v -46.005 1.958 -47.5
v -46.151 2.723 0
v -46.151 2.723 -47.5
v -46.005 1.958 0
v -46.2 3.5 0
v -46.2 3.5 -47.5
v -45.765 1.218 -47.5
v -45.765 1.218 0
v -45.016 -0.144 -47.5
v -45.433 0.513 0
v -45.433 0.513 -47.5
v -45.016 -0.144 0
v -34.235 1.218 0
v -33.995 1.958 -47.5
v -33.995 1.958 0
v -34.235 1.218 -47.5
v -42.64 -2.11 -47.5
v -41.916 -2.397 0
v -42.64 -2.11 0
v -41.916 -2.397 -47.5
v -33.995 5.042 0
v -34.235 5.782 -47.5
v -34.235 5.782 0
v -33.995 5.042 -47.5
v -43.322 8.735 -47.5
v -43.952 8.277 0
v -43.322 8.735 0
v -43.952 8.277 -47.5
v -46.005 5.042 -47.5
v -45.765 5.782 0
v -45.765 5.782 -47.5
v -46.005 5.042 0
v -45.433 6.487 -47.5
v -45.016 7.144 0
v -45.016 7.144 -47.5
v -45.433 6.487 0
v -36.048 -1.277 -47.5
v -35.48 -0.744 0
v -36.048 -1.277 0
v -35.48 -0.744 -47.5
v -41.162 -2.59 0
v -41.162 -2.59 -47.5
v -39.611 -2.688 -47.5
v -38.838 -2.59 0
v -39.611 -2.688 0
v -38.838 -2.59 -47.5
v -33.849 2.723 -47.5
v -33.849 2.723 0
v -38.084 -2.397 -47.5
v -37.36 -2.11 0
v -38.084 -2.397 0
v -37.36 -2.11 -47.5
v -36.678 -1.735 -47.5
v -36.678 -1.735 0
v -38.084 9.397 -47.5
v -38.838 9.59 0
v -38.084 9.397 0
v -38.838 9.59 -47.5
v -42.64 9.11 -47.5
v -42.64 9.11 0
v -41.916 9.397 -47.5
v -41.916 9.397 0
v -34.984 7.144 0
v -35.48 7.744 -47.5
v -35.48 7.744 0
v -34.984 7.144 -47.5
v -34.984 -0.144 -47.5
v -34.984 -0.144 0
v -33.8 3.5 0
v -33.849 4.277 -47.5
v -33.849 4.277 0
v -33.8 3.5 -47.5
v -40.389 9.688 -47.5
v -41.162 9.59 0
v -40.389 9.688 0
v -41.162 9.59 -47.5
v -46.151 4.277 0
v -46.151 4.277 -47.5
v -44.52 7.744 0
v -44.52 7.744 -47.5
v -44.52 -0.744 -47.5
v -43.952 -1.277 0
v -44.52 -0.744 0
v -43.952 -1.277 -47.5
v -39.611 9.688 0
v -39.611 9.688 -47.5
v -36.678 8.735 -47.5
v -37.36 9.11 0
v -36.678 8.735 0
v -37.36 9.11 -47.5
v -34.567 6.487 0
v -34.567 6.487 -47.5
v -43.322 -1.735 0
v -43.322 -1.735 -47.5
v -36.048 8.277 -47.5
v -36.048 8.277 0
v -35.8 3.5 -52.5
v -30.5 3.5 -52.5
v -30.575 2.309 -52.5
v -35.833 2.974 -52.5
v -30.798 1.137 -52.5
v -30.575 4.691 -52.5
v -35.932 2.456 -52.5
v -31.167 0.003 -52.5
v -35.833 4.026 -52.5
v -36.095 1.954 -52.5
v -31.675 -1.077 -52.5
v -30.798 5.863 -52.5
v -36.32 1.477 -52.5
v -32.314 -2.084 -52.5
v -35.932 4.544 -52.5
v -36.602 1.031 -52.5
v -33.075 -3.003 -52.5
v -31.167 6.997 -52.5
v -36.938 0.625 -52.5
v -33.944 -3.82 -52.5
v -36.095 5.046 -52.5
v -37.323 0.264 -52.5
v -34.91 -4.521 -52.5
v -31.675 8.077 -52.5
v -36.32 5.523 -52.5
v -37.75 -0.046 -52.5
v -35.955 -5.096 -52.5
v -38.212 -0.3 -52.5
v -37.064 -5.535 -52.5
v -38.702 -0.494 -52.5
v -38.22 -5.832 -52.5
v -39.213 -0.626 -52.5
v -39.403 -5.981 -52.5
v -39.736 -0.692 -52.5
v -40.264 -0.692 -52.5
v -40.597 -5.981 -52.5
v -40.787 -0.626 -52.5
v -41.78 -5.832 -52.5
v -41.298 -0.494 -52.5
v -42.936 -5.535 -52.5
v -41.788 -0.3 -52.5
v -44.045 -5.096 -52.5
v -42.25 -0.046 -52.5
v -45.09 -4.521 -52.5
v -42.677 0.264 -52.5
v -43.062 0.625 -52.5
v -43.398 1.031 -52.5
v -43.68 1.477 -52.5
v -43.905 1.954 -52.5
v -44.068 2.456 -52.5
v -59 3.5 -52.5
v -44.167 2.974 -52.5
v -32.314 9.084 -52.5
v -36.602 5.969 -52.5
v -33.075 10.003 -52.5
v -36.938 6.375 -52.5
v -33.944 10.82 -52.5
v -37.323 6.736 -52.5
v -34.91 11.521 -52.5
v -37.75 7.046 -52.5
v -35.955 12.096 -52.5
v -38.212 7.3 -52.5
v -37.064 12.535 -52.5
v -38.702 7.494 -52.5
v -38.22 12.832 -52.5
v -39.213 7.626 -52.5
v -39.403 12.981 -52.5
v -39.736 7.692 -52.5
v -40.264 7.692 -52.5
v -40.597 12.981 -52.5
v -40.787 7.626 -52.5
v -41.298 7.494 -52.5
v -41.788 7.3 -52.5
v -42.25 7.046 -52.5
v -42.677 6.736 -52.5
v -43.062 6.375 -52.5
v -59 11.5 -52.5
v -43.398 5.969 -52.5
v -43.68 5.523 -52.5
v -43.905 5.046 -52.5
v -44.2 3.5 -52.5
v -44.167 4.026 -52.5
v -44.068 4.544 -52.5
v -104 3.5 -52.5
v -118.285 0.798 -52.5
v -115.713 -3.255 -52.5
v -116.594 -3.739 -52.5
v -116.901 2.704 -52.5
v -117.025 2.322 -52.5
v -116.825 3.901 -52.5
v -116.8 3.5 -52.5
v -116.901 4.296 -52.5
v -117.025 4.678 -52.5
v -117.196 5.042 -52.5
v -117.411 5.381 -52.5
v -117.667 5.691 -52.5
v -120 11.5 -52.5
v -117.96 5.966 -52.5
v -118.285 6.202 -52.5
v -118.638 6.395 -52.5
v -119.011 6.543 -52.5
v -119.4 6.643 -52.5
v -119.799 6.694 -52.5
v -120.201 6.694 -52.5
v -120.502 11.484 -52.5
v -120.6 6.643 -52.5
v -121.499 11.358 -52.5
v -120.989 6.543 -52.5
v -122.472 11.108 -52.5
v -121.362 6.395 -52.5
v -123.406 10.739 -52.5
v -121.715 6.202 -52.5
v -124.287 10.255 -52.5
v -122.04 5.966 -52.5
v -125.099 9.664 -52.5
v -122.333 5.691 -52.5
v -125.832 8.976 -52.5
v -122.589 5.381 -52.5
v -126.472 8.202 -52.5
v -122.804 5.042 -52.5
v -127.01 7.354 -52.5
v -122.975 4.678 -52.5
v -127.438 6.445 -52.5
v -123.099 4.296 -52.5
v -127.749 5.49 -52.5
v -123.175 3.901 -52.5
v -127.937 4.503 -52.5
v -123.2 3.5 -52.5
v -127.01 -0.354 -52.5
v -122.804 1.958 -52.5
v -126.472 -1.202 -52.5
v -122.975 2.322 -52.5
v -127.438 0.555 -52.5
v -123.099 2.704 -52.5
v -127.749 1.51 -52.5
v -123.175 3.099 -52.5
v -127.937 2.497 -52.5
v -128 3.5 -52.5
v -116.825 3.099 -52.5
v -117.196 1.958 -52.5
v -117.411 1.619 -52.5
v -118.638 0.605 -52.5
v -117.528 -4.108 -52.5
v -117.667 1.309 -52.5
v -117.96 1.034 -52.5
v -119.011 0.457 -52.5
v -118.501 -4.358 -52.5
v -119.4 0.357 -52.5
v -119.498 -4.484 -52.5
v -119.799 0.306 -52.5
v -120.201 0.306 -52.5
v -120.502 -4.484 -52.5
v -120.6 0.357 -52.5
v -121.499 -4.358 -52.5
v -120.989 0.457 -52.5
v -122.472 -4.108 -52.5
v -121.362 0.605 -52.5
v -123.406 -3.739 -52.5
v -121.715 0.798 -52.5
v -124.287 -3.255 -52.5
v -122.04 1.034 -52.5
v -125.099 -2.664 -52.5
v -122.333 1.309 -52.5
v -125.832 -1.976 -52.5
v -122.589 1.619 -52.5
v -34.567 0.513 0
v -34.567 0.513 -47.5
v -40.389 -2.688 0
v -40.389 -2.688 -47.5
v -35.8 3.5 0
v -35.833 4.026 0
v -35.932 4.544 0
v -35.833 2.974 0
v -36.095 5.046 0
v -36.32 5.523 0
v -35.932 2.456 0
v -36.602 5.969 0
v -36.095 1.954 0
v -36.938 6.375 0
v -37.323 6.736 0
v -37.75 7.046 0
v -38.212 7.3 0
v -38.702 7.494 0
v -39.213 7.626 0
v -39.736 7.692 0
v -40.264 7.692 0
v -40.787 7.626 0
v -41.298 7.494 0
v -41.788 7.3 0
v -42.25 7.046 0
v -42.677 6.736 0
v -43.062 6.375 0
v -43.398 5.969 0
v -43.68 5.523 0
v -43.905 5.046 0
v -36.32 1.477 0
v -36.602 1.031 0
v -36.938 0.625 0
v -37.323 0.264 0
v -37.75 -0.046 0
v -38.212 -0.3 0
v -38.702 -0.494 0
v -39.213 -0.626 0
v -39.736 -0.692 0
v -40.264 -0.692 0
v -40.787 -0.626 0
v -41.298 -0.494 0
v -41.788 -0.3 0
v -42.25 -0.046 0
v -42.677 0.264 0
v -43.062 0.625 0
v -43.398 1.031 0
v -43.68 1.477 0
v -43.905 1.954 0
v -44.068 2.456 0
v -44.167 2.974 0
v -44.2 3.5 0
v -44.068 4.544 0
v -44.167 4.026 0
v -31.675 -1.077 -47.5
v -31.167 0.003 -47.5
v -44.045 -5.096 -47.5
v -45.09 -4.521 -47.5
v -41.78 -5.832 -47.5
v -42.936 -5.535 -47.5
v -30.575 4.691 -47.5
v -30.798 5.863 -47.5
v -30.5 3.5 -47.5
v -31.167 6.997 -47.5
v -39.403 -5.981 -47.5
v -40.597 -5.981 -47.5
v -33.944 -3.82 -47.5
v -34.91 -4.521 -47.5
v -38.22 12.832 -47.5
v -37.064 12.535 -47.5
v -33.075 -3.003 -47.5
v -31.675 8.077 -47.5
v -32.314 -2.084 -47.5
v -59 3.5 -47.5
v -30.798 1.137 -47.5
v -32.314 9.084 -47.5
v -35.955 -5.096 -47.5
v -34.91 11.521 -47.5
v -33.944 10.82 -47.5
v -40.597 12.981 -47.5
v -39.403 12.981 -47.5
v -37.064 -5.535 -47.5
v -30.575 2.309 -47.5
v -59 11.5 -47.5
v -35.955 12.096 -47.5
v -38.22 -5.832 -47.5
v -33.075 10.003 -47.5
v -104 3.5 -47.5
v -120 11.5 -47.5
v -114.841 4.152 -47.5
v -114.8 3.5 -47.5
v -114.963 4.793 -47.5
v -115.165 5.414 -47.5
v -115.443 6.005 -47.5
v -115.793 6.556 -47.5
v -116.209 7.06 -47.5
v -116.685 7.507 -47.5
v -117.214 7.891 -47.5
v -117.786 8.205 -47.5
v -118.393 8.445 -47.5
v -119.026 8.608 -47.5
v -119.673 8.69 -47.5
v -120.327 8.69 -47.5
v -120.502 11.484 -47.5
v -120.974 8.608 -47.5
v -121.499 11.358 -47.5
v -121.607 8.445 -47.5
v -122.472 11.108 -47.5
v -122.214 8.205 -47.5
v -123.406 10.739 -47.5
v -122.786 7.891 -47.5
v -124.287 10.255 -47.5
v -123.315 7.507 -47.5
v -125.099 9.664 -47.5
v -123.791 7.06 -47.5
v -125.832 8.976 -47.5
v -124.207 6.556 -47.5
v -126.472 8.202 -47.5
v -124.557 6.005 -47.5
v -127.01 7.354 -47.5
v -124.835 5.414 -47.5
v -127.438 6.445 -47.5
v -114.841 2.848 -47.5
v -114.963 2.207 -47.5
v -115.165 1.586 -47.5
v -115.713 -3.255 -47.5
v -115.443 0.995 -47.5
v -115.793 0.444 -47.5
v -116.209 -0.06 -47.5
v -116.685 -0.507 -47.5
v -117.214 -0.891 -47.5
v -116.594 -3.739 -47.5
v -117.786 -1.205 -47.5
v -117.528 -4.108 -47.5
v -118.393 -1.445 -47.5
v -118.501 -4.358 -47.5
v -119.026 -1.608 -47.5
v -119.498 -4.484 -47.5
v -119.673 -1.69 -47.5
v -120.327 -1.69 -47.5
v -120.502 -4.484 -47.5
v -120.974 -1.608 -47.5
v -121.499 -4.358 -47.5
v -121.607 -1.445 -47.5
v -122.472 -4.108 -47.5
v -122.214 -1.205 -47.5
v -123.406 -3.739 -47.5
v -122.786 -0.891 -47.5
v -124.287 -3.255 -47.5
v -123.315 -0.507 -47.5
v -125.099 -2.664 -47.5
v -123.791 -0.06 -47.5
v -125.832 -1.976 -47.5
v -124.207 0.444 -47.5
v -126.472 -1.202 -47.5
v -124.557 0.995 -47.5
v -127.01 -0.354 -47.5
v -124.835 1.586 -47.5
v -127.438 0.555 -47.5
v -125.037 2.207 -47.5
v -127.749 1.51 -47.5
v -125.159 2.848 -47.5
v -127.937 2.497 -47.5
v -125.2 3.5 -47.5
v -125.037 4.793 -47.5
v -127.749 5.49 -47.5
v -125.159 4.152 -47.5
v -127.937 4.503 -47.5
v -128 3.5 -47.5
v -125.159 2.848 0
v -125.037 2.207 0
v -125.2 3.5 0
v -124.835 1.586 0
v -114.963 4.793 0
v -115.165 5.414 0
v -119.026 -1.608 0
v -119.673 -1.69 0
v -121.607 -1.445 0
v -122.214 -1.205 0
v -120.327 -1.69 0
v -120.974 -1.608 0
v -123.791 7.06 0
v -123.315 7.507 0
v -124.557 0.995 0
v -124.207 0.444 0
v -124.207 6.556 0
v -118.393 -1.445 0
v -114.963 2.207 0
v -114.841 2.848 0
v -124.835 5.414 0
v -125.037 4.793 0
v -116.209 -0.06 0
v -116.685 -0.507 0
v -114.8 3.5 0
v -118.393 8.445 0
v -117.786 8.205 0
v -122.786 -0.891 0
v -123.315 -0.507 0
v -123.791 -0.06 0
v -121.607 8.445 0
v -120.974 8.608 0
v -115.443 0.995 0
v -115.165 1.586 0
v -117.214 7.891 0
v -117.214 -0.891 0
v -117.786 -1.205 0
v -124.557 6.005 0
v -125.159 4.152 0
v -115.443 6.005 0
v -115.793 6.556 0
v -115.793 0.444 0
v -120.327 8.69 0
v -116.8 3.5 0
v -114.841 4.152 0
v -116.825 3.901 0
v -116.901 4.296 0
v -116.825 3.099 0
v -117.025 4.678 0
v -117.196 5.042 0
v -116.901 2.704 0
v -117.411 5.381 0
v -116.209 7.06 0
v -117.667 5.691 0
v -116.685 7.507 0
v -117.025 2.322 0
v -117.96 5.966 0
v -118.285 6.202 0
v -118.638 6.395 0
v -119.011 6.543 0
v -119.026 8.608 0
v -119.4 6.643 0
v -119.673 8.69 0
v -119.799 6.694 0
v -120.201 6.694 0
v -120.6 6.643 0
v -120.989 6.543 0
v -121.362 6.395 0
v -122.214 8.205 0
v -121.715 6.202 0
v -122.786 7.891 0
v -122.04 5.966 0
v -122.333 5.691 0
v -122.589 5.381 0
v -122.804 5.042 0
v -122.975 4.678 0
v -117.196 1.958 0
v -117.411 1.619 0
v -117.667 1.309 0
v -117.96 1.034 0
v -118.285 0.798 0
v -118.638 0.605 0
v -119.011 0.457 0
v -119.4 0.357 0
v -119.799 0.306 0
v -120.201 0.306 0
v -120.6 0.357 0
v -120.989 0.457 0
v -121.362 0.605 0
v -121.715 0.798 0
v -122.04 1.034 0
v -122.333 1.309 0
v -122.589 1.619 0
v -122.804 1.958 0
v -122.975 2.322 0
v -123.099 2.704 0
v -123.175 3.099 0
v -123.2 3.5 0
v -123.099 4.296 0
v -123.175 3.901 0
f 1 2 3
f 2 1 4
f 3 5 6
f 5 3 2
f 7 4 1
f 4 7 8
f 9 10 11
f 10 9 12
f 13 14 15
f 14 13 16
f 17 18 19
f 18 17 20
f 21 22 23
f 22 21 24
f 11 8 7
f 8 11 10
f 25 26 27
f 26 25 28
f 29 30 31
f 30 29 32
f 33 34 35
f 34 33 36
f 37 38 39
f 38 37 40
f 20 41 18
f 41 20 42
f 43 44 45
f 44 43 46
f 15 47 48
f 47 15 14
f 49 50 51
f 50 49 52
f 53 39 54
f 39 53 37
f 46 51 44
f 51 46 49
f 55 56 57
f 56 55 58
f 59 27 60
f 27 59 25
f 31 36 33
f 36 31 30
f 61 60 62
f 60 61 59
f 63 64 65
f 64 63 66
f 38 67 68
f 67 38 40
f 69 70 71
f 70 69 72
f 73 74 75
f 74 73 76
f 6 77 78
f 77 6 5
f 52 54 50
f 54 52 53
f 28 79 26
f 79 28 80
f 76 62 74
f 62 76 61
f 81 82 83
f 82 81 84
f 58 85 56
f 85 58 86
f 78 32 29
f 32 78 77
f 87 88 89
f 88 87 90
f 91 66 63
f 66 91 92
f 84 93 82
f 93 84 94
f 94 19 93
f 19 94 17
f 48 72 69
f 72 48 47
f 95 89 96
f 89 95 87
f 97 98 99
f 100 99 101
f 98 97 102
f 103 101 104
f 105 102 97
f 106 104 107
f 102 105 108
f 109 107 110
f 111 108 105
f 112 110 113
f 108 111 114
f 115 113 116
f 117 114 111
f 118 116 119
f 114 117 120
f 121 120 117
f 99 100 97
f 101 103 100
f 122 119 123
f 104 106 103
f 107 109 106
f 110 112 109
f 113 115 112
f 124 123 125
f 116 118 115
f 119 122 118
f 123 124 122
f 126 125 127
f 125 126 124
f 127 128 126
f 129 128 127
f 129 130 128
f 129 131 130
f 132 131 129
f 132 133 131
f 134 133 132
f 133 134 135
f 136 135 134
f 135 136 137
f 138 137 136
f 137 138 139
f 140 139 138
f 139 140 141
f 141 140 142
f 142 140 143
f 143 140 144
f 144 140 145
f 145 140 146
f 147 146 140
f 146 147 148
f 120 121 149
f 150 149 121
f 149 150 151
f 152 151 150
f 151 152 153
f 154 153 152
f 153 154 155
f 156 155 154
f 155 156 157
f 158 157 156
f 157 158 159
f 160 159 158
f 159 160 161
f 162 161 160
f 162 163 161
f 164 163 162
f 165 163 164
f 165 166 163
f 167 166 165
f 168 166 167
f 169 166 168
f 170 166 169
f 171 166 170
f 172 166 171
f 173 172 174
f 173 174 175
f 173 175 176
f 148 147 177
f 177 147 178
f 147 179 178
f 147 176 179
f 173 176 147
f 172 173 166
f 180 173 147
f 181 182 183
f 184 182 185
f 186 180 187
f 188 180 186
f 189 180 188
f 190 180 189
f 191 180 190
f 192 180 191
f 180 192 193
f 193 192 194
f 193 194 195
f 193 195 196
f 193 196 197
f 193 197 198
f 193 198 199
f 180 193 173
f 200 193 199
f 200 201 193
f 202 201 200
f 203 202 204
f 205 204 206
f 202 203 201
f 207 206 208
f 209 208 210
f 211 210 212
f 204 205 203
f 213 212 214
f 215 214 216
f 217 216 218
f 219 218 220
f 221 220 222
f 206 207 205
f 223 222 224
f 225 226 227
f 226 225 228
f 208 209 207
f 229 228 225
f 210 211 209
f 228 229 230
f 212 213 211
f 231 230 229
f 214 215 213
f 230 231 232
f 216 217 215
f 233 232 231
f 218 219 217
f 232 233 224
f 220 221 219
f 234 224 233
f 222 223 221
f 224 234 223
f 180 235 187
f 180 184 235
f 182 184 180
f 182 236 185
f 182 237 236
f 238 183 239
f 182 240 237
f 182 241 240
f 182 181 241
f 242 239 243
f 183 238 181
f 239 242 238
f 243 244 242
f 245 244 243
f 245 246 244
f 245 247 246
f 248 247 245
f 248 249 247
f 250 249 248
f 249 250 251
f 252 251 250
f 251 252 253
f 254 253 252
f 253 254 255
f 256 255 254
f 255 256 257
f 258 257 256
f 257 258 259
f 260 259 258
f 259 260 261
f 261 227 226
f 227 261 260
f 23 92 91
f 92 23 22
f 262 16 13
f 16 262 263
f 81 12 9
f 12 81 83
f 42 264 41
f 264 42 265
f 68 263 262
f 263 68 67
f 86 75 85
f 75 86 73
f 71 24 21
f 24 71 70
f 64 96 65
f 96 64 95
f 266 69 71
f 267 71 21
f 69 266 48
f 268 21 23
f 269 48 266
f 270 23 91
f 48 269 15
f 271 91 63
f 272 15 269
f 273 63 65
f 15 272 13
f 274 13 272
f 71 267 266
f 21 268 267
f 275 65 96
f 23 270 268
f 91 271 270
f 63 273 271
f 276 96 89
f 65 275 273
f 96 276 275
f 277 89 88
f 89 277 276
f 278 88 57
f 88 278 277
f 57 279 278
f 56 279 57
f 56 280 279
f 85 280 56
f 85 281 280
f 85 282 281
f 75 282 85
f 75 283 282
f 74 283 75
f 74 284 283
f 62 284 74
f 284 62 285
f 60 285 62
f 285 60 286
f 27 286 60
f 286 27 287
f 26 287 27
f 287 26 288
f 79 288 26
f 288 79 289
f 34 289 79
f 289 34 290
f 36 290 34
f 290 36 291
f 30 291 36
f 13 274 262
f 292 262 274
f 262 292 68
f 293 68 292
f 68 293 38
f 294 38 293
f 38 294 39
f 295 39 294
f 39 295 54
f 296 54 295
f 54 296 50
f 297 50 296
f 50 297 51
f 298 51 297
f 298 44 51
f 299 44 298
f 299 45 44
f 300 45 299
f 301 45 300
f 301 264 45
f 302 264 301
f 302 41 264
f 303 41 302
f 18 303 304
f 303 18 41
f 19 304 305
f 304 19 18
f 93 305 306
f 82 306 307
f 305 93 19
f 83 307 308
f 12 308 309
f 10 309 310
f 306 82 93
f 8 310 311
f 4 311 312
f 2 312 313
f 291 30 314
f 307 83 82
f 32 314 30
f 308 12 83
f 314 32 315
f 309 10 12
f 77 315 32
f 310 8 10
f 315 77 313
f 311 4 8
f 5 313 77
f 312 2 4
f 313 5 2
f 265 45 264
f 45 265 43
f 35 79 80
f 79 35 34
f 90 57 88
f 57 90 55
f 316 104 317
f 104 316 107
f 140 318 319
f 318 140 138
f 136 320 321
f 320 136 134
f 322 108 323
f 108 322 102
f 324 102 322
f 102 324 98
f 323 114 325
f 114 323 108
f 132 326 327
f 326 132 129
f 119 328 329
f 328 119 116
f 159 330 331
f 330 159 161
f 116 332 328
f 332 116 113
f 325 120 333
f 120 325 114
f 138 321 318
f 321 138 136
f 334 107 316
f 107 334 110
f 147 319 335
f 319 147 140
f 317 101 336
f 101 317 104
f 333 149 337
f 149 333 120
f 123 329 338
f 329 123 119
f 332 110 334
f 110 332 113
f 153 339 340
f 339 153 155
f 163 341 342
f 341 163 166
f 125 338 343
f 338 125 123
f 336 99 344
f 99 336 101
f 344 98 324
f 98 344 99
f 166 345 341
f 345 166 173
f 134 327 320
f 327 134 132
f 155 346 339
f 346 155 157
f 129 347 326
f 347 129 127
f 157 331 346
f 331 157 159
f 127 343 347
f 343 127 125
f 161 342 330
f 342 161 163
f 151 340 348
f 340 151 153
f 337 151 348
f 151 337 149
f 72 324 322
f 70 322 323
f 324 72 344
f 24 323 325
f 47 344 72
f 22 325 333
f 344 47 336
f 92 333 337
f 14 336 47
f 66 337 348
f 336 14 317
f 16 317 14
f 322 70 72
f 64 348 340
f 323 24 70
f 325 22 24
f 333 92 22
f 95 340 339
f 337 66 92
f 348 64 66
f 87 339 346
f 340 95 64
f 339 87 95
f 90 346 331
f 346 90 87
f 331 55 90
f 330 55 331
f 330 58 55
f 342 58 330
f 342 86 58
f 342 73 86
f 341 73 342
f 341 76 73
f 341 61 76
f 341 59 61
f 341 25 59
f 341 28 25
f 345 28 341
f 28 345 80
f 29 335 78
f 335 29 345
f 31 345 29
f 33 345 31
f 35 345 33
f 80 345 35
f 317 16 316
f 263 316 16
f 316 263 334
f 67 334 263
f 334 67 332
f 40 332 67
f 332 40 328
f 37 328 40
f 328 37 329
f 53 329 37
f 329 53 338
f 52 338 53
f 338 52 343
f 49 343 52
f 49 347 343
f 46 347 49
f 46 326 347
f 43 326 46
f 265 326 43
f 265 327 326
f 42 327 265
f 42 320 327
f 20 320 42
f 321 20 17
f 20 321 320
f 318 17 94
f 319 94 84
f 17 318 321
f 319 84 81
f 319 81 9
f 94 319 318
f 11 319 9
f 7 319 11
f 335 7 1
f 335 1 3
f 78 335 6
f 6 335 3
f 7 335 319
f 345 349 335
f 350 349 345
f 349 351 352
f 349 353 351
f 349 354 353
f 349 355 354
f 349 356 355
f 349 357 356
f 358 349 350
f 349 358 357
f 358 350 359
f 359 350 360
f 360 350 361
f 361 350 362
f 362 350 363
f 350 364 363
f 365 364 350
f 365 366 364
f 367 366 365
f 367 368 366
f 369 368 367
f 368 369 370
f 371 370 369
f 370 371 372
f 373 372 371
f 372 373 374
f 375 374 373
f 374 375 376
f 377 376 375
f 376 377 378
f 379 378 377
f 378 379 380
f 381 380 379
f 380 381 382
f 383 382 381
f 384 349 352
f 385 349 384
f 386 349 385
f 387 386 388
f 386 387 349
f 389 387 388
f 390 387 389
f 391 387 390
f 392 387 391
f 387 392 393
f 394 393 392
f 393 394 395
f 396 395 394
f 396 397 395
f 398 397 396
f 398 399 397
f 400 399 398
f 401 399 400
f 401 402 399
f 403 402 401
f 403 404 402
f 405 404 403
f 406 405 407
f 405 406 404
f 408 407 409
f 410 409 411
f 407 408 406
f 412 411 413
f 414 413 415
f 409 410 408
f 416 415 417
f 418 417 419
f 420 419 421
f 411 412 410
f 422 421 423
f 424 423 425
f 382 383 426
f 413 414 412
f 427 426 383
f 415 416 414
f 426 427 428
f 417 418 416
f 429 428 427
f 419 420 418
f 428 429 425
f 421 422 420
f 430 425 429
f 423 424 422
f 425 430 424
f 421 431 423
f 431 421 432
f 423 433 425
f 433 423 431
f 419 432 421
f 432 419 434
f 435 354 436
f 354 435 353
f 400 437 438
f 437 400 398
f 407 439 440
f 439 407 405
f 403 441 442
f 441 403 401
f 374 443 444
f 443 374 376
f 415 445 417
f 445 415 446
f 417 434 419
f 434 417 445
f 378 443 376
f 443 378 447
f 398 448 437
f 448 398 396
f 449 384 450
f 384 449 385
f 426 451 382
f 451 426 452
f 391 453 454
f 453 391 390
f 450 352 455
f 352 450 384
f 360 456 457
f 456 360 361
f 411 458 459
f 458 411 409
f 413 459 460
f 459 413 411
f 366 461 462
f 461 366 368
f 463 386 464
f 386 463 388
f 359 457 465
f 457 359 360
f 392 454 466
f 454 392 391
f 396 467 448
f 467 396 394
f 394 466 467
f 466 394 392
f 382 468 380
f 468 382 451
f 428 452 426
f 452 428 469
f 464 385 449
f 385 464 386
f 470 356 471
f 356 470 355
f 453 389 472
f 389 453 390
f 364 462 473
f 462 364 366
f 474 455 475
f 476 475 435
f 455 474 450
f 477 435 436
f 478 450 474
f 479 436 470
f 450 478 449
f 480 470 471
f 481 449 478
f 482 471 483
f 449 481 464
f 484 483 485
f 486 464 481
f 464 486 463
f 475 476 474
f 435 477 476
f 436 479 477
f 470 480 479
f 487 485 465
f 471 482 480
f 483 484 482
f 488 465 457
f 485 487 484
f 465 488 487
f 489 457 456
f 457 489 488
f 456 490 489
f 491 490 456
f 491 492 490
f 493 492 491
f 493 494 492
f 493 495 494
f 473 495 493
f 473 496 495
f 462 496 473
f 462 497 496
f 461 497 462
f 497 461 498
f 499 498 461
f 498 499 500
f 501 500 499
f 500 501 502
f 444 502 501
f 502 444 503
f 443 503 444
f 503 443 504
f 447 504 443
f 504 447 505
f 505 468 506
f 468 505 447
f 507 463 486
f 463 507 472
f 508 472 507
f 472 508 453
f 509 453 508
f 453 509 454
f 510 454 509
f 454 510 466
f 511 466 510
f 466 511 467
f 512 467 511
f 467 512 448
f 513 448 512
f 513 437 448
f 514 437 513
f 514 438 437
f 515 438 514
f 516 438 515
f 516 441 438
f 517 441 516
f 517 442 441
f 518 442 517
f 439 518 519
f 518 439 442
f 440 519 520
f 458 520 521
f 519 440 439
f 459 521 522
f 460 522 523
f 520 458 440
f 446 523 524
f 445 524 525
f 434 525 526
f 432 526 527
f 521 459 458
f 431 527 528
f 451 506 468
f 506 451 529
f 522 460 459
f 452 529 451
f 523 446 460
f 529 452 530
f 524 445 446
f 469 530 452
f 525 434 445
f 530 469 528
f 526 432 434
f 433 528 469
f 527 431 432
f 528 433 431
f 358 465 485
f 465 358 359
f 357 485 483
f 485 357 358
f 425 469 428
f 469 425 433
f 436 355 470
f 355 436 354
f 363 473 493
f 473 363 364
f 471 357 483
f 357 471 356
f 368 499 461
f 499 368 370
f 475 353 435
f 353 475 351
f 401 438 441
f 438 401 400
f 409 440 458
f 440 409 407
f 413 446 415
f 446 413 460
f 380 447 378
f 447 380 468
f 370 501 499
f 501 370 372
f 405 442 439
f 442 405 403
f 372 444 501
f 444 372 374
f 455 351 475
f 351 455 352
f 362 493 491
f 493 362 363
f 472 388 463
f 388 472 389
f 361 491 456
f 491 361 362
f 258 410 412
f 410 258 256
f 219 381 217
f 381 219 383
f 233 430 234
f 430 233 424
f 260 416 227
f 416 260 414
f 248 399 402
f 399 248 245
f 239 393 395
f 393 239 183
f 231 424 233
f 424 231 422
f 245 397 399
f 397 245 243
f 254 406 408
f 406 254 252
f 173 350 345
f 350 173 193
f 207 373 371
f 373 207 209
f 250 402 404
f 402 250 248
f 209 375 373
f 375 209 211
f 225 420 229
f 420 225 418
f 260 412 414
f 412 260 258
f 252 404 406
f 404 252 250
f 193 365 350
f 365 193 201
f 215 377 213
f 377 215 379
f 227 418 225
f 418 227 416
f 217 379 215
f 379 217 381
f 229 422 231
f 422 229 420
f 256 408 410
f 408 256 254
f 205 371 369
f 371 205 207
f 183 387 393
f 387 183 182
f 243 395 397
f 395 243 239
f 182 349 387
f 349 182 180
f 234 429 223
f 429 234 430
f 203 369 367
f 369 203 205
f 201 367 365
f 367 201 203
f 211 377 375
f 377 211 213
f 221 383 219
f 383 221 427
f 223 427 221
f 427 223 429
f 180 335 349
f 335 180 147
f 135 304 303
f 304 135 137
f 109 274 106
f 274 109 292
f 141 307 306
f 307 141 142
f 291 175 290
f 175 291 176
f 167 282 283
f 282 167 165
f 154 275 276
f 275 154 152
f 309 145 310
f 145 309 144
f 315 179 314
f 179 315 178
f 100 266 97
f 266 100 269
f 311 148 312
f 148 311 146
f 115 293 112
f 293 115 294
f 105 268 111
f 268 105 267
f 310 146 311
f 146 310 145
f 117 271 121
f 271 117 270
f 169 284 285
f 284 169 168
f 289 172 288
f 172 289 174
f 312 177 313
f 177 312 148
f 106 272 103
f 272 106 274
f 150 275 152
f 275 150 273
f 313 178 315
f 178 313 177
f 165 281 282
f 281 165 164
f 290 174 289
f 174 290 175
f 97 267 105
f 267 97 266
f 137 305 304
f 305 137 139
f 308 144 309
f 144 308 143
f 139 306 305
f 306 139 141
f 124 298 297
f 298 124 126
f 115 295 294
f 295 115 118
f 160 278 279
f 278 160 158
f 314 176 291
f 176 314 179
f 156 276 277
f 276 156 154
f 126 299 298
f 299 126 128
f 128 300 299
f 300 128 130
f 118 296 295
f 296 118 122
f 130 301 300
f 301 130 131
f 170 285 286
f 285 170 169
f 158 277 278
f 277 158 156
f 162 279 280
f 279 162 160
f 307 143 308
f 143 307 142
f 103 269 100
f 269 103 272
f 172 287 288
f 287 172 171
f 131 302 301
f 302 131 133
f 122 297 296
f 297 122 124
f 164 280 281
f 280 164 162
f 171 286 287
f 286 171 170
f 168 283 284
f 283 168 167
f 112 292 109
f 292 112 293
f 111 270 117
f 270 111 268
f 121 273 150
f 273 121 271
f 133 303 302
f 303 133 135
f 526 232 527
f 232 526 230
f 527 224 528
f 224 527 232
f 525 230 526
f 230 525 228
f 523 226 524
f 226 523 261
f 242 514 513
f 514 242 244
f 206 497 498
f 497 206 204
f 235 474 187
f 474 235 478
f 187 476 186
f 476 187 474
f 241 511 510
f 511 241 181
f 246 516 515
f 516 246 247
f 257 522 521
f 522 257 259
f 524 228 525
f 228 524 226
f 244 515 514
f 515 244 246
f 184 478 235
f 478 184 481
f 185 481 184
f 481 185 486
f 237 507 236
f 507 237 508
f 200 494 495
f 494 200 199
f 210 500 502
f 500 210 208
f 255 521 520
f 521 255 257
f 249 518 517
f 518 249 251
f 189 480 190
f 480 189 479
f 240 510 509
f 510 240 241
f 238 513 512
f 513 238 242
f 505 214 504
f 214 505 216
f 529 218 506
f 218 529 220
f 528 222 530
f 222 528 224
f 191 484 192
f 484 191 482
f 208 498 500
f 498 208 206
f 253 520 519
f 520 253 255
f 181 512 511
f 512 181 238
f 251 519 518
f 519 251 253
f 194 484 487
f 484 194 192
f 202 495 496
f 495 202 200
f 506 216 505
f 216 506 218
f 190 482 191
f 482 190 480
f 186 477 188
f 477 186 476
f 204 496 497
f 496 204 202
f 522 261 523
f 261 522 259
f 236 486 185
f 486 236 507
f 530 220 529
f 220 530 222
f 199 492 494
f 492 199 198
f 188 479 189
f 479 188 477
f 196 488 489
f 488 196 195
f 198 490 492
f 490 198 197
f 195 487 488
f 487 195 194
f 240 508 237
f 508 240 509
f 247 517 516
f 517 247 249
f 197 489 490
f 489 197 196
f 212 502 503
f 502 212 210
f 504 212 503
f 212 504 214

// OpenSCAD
// file: ../planelib/motor.scad
yoff=10+2;
xoff=5;//10+17;
xlen=200;

module wingBoom( bd=8, diff=0.1, len=500 )
{
    translate([xoff,yoff,zBoom])
    translate([ -200,0,0]) rotate([0,90,0])cylinder(d=bd+diff,h=len,center=true);  //8mm version

}



module wingMotorPlate( diff=0, holes=true )
{
    h0=12;
    module mcylinder( diff=0 )
    {
        rotate([0,-90,0]) 
            translate([ 0,0,-3-diff ]) 
                cylinder(d=33+diff, h=55+diff,center=false);   // body cylinder
    }
    
    module mholes()
    {
        rotate([0,-90,0]) 
            ScrewMotorPlate(screwlen=60);
    }
    
    module cable_hole()
    {
        translate( [ -3, 15, 0 ] )
        rotate([90,0,0])
        hull(){
            translate([-10,0,0]) cylinder(d=5,h=10,center=true );
            translate([0,-2,0]) cylinder(d=4,h=10,center=true );
            translate([0,+2,0]) cylinder(d=4,h=10,center=true );
        }
    }

    difference(){
        union()
        {
            translate([xoff,yoff,zBoom])
                difference(){
                    mcylinder(0+2*diff);
                    if( holes==true ){
                        mcylinder(-4-2*diff);
                        mholes();
                        cable_hole();
                    }
                }
            translate([xoff,yoff,zBoom])
                intersection(){
                    mcylinder(0);
                    translate([-tubeOffset1-xoff ,tubeOffsety-yoff, 0]) 
                        cylinder(d=dBar1+8, h=33,center=true ); // bar mount
                    }
        }
        union()
        {
            if( holes==true ){
                translate([-tubeOffset1 ,tubeOffsety, zBoom]) 
                            cube([dBar1+10,dBar1+10,12+0.2], center=true );
                translate([ xoff-120/2-tubeOffset1, yoff, zBoom]) 
                    rotate([0,90,0])
                        cylinder(d=8+0.3+4+0.5,h=140,center=true);  // mount for boom 8mm version
                            
                wingPolyLine( d=dPoly, pt=pSD6060[31], off=[+2,+0.5] );
                wingElectric();
                xTube( diameter=8+0.1, length=1000, tubeoffset=tubeOffset1 );
                translate( [-xoff+0, yoff-11.2, zBoom ] ) 
                    rotate([90,0,0])
                        ScrewAndHexNut( m=2,dist=10 );
                }
            
        }
    }


}

module wingMotor(diff=0, holes=true) //use diff!!!!!
{
    h0=12; //10;    
    {
        difference(){
            union(){
                Slice(){
                    wingSolid(r=-1/*diff*/);
                    translate([ xoff-130/2-3-10, yoff-15+1, zBoom]) cube([150,25+2,h0], center=true );
                    }
                
                translate([-tubeOffset1 ,tubeOffsety, zBoom]) cylinder(d=dBar1+10, h=h0,center=true );
                translate([-tubeOffset2 ,tubeOffsety, zBoom]) cylinder(d=dBar2+10, h=h0,center=true );
                
                translate([ xoff-120/2-tubeOffset1, yoff, zBoom]) rotate([0,90,0])cylinder(d=8+4,h=120,center=true);  //8mm version
                
                }
            union(){
                translate([xoff-153,yoff-21,zBoom])
                    rotate([0,0,-45])
                        cube([20,20,20], center=true );

                if( holes==true ){
                    color("Black") wingBoom();
                    color("Black") xTube( diameter=8+0.2, length=1000, tubeoffset=tubeOffset1 );
                    color("Black") xTube( diameter=6+0.2, length=400, tubeoffset=tubeOffset2 );   
                    wingMotorPlate(diff=0.1); 
                    wingPolyLine( d=dPoly, pt=pSD6060[31], off=[+2,+0.5] );
                    *wingPolyLine( d=dPoly, pt=ptQRuder, off=[+0,+0] );
                    wingElectric();
                    translate( [-xoff+0, yoff-11.2, zBoom ] ) 
                        rotate([90,0,0])
                            ScrewAndHexNut( m=2,dist=10 );
                    translate([xoff,yoff,zBoom])
                        translate([-83,-8,0]) rcube([54,4,20], round=3);
                    translate([xoff-35,yoff-15,zBoom]){
                        translate([-113,2,0]) cube([30,20,1.2], center=true );
                        translate([-113,8,0]) ScrewAndHexNut( m=2,dist=8 );
                        }
                        
                    }
                }
        }
       
    }
    
    *translate([xoff,yoff,zBoom]){
        color("Red") translate([15+12,0,0]) rotate([0,90,0]) cylinder(d=7*25.4,h=8,center=true);   // propeller     
        color("Red") translate([12,0,0]) rotate([0,90,0]) cylinder(d=33,h=17,center=true);   // motor
        *%translate([0,-60,0]) cube( [300,1,500], center=true );
        }
    *color("Black") xTube( diameter=8, length=1000, tubeoffset=tubeOffset1 );
    *color("Black") xTube( diameter=6, length=400, tubeoffset=tubeOffset2 );    
    *wingMotorPlate(diff=0);

}

module wingMotorCoverSolid()
{
    diff=0;
    hull(){
        translate([xoff-55,yoff,zBoom]) // body cylinder taken from wingMotorPlate()
            rotate([0,-90,0]) 
                translate([ 0,0,-3-diff ]) 
                    cylinder(d=33+diff, h=1,center=false);   
        translate([ xoff-120+0.5-tubeOffset1, yoff, zBoom]) rotate([0,90,0])cylinder(d=8+4+2,h=1,center=true);  // taken from wingMotor
        }
}

module fuseMotor(d=0.5, holes=true) // not needed with two motors at the wings
{
// 19mm Löcher, Motokreuz: Balken mit 2 Schrauben, Gegenstück in den Rumpf kleben....
    translate([9.5,0,0])
    difference()
    {
        union()
        {
            translate([-280,0,0]){   // cutout inner Motormount
                rotate([0,90,0]) cylinder( d=30-d, h = 3 ); // h=5 was too fat, because it is solid
                }
            translate([-282,0,0]){   // cutout outer Motormount
                rotate([0,90,0]) cylinder( d=35-d, h=3 );
                }
            translate([-282,0,0]){   // cutout outer Motormount
                rotate([0,90,0]) resize([50,20,3])cylinder( d=35-d, h=3 );
                }
            translate([-260,0,+20]) 
                    rotate([0,-90,0]) 
                        cylinder( d=3.8, h=30 );   
            translate([-260,0,-20]) 
                    rotate([0,-90,0]) 
                        cylinder( d=3.8, h=30 );  
            if( !holes ){
            translate([-250+6,0,-20]) 
                    rotate([0,-90,0]) 
                        cylinder( d=6.5, h=30,$fn=6 );   
            translate([-250+6,0,+20]) 
                    rotate([0,-90,0]) 
                        cylinder( d=6.5, h=30,$fn=6 );   
                }
            
        }
        if(holes)
        union()
        {
            translate([-270,0,0]) 
                    rotate([0,-90,0]) 
                        cylinder( d=9, h=40 );   
            translate([-270,0,0])
                rotate([0,-90,0])
                    for( rot=[0:90:360] )
                        rotate([0,0,rot+45])
                            translate([0,19/2,0])
                                    cylinder( d=3.8, h=40 );
            translate([-260,0,+20]) 
                    rotate([0,-90,0]) 
                        cylinder( d=3.8, h=30 );   
            translate([-260,0,-20]) 
                    rotate([0,-90,0]) 
                        cylinder( d=3.8, h=30 );   
        }
    }
}
// file: ../planelib/ruder2.scad
// Ruder new version, test with small cut, printable?

*cutterObjectAll( ptStart=[0,0,0], dStart=20, ptStop=[-20,0,100], dStop=10, dSpace=1.0 );
*cutterMask( ptStart=[0,0,0], dStart=20+2*1, ptStop=[-20,0,100], dStop=10+2*1 );

function RuderGetSize( z, zStart, zStop, sStart, sStop ) = ( ( sStart + (sStop-sStart)/(zStop-zStart)*(z-zStart) ) );
function RuderGetHeight( z, zStart, zStop, sStart, sStop, hBase ) = ( RuderGetSize( z, zStart, zStop, sStart, sStop) * hBase );
function RuderGetPoint( z, zStart, zStop, sStart, sStop, ptBase ) = ( RuderGetSize( z, zStart, zStop, sStart, sStop) * ptBase );
function RuderGetXOffset( z, zStart, zStop, oStart, oStop ) = ( ( oStart + (oStop-oStart)/(zStop-zStart)*(z-zStart) ) );

module Ruder2( ptStart=[0,0,0], dStart=20, ptStop=[0,0,100], dStop=10, dSpace=1.0, rot=45, steps=5, inverse=false, horn=false )
{
    difference(){
        children();
        cutterObjectAll(  ptStart, dStart, ptStop, dStop, dSpace, rot, steps, inverse );
        cutterInnerAxis( ptStart, ptStop );
        cutterEnds( ptStart, dStart, dSpace, axis=false );
        cutterEnds( ptStop, dStop, dSpace, axis=false );
        }
        
    if( horn ) 
        RuderHorn( dbase=dStart, pos = ptStart + [0,0,dSpace/2] );
}

module RuderHorn( dbase, daxsis=2.2, dwire=2, pos=[0,0,0], h=2, a=18 )
{
    b=a;
    translate( pos ) 
        difference(){
            union(){
                hull(){
                    translate([0,0,0])  cylinder( d=dbase-2, h=h, center=false );
                    translate([-a,0,0]) cylinder( d=2, h=h, center=false );
                    }
                hull(){
                    translate([-a,0,0]) cube( [10,1,h], center=false );
                    translate([0,b,0])  cylinder( d=6, h=h, center=false );
                    }
                }
            union(){
                translate([0,0,0])  cylinder( d=daxsis, h=h, center=false );
                translate([0,b,0])  cylinder( d=dwire, h=h, center=false ); 
                //translate([-a,0,0])  cylinder( d=dwire, h=h, center=false ); 
                c = b-6/2-dbase/2; 
                *translate([-c,c,0])  cylinder( d=c, h=h, center=false ); 
            }
    }
}

module cutterObjectAll( ptStart, dStart, ptStop, dStop, dSpace, rot=45, steps=5, inverse=false )
{
    ptDelta = (ptStop - ptStart) / steps; 
    dDelta = (dStop - dStart) / steps; 
    
    for( i=[0:steps-1] )
    {
        dir = inverse ? !((i%2)==0) : ((i%2)==0) ;
        cutterObjectSingle(  
            ptStart+i*ptDelta, dStart+i*dDelta, 
            ptStart+(i+1)*ptDelta, dStart+(i+1)*dDelta, 
            dSpace, dir, steps );
    }
}

module cutterObjectSingle( ptStart, dStart, ptStop, dStop, dSpace, dir=false, rot=45 )
{
    difference()
    {
        union()
        {
            cutterCylinder( ptStart, dStart+2*dSpace, ptStop, dStop+2*dSpace );
            if( dir == true )
            {
                cutterMask( ptStart, dStart+2*dSpace, ptStop, dStop+2*dSpace, dir, rot=+rot );
                cutterMask( ptStart, dStart+2*dSpace, ptStop, dStop+2*dSpace, dir, rot=-rot );
            }
            cutterSpacer( ptStart, dStart+2*dSpace, dSpace );
            cutterSpacer( ptStop, dStop+2*dSpace, dSpace ); // this partly dublicate
        }
        union()
        {
            cutterCylinder( ptStart, dStart, ptStop, dStop );
            cutterHalf( ptStart, dStart, ptStop, dStop, dir );
        }
    }
}

module cutterCylinder( ptStart, dStart, ptStop, dStop )
{
    hull()
    {
        translate( ptStart ) cylinder( d=dStart, h=0.001, center=true );
        translate( ptStop )  cylinder( d=dStop, h=0.001, center=true  );
    }
}

module cutterMask( ptStart, dStart, ptStop, dStop, dir=true, rot=40 )
{
    oxStart = dir ? 0 : -dStart;
    oxStop = dir ? 0 : -dStop;
    
    hull(){
        translate( ptStart ) 
            rotate( [0,0,rot] )
                translate( [oxStart,-dStart/2,0] )
                    cube([dStart/2,dStart, 0.001], center=false );
        translate( ptStop ) 
            rotate( [0,0,rot] )
                translate( [oxStop,-dStop/2,0] )
                    cube([dStop/2,dStop, 0.001], center=false );
        }
}

module cutterHalf( ptStart, dStart, ptStop, dStop, dir=true )
{
    oxStart = dir ? 0 : -dStart;
    oxStop = dir ? 0 : -dStop;
    hull(){
        translate( ptStart ) 
                translate( [oxStart,-dStart,0] )
                    cube([dStart,2*dStart, 0.001], center=false );
        translate( ptStop ) 
                translate( [oxStop,-dStop,0] )
                    cube([dStop,2*dStop, 0.001], center=false );
        }
}

module cutterSpacer( ptStart, dStart, dSpace )
{
    translate( ptStart )
        cylinder( d=dStart, h=dSpace, center=true );
}

module cutterInnerAxis( ptStart, ptStop, dAxis=2.2 )    // set the correct parameter dAxis
{
    hull()
    {
        translate( ptStart ) sphere( d=dAxis );
        translate( ptStop ) sphere( d=dAxis );
    }
}

module cutterEnds( pt, d, dSpace, axis=false )
{
    translate( pt ) 
        difference()
        {
            union()
            {
                cylinder( d=d+2*dSpace, h=dSpace, center=true );
                translate( [-100,-20,-dSpace/2] ) cube( [100,40,dSpace], center=false );
            }
            if ( axis==false ) cylinder( d=d+2*dSpace, h=dSpace, center=true );
        }
}
// file: ../planelib/screw.scad
// screw and nut helper


//ScrewAndHexNut( m=2, $fn=50 );

module ScrewAndHexNut( m=2, dist=10 )
{
    
    dscrew  = (m==2) ? 2.3 : ((m==3) ? 3.2 : 4.1 );   // screw, loose
    dnut    = (m==2) ? 4.6 : ((m==3) ? 6.2 : 8.0 );   // hex nut, measured
    dhead   = (m==2) ? 4.2 : ((m==3) ? 5.8 : 7.0 );   //hex head
    
    translate( [ 0, 0, -dist/2-10/2 ] ) 
        cylinder(d=4.6, h=10, center=true, $fn=6 ); //m2 nut, 6 edge hole
    translate( [ 0, 0, 0 ] ) 
        cylinder(d=2.3, h=dist+20, center=true ); //m2 screw
    translate( [ 0, 0, +dist/2+10/2 ] ) 
        cylinder(d=4.2, h=10, center=true ); //m2 head
}

module ScrewServo( dist=10 )
{
    cylinder(d=1.5, h=dist ); // servo screw, does not realy fit
}

module ScrewMotorPlate( dscrew=3.5, distmin=15.5, distmax=19.5, dcenter=8, rotoffset=0, screwlen=6, plate=6 )
{
    for( a=[45:90:360]) 
        rotate([0,0,a+rotoffset]) 
            hull(){
                translate( [0, distmax/2, -plate-0.1] ) // max plate is fixed 6
                    cylinder( d=dscrew, h=screwlen, center=false ); // motor screws
                translate( [0, distmin/2, -plate-0.1] ) 
                    cylinder( d=dscrew, h=screwlen, center=false ); // motor screws
                }
    translate( [0, 0, -plate-0.1] ) 
        cylinder( d=dcenter, h=plate+1, center=false ); // motor center

}
// file: ../planelib/servo.scad
servo_size_1 = [25.5,12,37];  // mg90s
servo_size_2 = [33.5,12,3];

*servo_sg90($fn=50);

module servo_sg90()
{
        cube( servo_size_1, center=true );
        translate([0,0,3.5]) 
            cube( servo_size_2, center=true );
        // servoarm...
        translate([-5,6,17])
        resize([60,12,6+1])
        sphere( d=1 );
}
    

module ServoDiff( sx=100, sy=7, sz=348, rot=0 )
{ 
    //sx = s[i]*(tubeOffset1+tubeOffset2)/2;  // between the tubes
    //sz = (o[i+1].z-o[i].z)/2;   // in the middle of the segment
    //sz = -2;
    translate( [-sx, sy, sz])
            rotate([0,rot, 2])
                servo_sg90();
                
    
    // kabelkanal
    *translate( o[i] + [-sx+10, +11-2-2, hz/2-13])
            rotate([0,90,4])
                cube([12,5,10]);
}
// file: ../planelib/polyline.scad
module wingPolyLine( d=3, pt=[0,0], off=[0,0]  )
{
    *echo(pt);
    l = len(s)-1; 
    poly = [         [o[0].x - s[0]*pt.x - off.x , o[0].y + s[0]*pt.y + off.y,  o[0].z - 20 ],
        for(i=[0:l]) [o[i].x - s[i]*pt.x - off.x , o[i].y + s[i]*pt.y + off.y,  o[i].z ],
                     [o[l].x - s[l]*pt.x - off.x , o[l].y + s[l]*pt.y + off.y,  o[l].z + 20 ] ];
    *echo( poly);
    for( i=[0:(len(poly)-2)] ){
        hull(){
            translate(poly[i]) 
                sphere( d=d );
            translate(poly[i+1]) 
                sphere( d=d );
            }
        }
}

module fusePolyLine( d=3, size=605, off=[0,0], p=pClarkFusePolyUp )
{
    for( i=[0:(len(p)-2)] ){
        hull(){
            translate([p[i].x*size, p[i].y*size+off.y, +off.x]) 
                sphere( d=d );
            translate([p[i+1].x*size, p[i+1].y*size+off.y, +off.x]) 
                sphere( d=d );
            }
        *echo( p[i] );
        }
}

module fusePolyLineQ( d=3, size=605, pt=[0,0], off=[0,0] )
{
    poly = [        
                    [o[1].x - s[1]*pt.x - off.x , o[1].y + s[1]*pt.y + off.y,  +o[1].z ],
                    [o[0].x - s[0]*pt.x - off.x , o[0].y + s[0]*pt.y + off.y,  +o[0].z ],
                    [o[0].x - s[0]*pt.x - off.x , o[0].y + s[0]*pt.y + off.y,  -o[0].z ], 
                    [o[1].x - s[1]*pt.x - off.x , o[1].y + s[1]*pt.y + off.y,  -o[1].z ]
                    ];
                    
        for( i=[0:(len(poly)-2)] ){
                hull(){
                    translate(poly[i]) 
                        sphere( d=d );
                    translate(poly[i+1]) 
                        sphere( d=d );
                    }
        }
}

module offsetPolyLine(  d=3, size=605, off=10, p=pClarkY )  // this does not yet work, just a test.
{
    for( i=[0:(len(p)-1)] ){
        po = size * p[i];
        pv = size * ((i>0) ? p[i-1] : p[len(p)-1]);
        pn = size * ((i>(len(p)-2)) ? p[0] : p[i+1]);

        pop = (pv + pn)/2 + po;
        p02 = pn - po;
        z = p02.x * pop.y + p02.y * pop.x;
        
        pt = sign( z ) * pop * (off/norm(pop));
       

        
        hull(){
            translate([po.x+pt.x, po.y+pt.y, 0]) 
                sphere( d=d );
            translate([pn.x+pt.x, pn.y+pt.y, 0]) 
                sphere( d=d );
            }
        echo( po, pop, z );
    }
}
// file: ../planelib/wing.scad
module segment( s, o, r=0, p=pSD6060, begin=0, end=1 )
{
    factor = ( s[1] ) / ( s[0] );
    height = ( o[1].z - o[0].z );
    sx = ( o[1].x - o[0].x ) / height;
    sy = ( o[1].y - o[0].y ) / height;
    
    m=[ [ 1, 0,  sx, 0],
        [ 0, 1,  sy, 0],
        [ 0, 0,  1,  0],
        [ 0, 0,  0,  1] ];
    
    translate(o[0])
        multmatrix(m)
            linear_extrude( height=height, scale=factor, convexity=10 ) 
                intersection()
                {
                    spant2d( s=s[0], r=r, p=p );
                    scale(s) 
                        mirror([1,0]) // vgl spant2d()
                            translate( [begin,-0.5] ) 
                                square( [(end-begin), 1] );
                }
}


module spant3d( d=0.3, offset=[0,0,0], size=100, r=0, p=pSD6060 )
{
    translate(offset) linear_extrude( d, convexity=10 ) spant2d(size,r,p);
}

module spant3dDiff( d=0.3, offset=[0,0,0], size=100, rot=[0,0,0], ra=0, ri=-2.5, p=pSD6060 )
{
    translate(offset) rotate(rot) translate([0,0,-d/2]) linear_extrude( height=d, convexity=10 )
    difference()
    {
        spant2d( s=size, r=ra, p=p );
        spant2d( s=size, r=ri, p=p );
    }
}

module spant2d(s=1, r=0, p=pSD6060 )
{
    offset(delta=r)
    //alternative: offset(r=r)
    scale(s)
    mirror([1,0])  // sollte das weg?
    polygon(p);
}
// file: ../planelib/skin.scad
module outerSkin( d=1, h=0, center=true )
{
    hgt = (h<=0) ? h : 2*d;
    difference(){
        minkowski(){
            children();
            cylinder(r=d,h=hgt,center=center ); 
        }
        children();
    }
}

module outerSkin2( d=1, h=0, center=true )
{
    hgt = (h<=0) ? h : 2*d;
    difference(){
        minkowski(){
            children(0);
            cylinder(r=d,h=hgt,center=center ); 
        }
        children(1);
    }
}

module innerSkin( )
{
    difference(){
        children(0);
        children(1);    
        }
}

module skin2()
{
    difference()
    {
        minkowski()
        {
            children(0);
            children(1);    
        }
        children(0);
    }
}

module Slice( )
{
    intersection()
    {
        children(0);
        children(1);
    }
}

module gridSlice( dy=30, angy=30, grid=2, dim=1000 )
{
    Slice(){
        children();
        for(z=[-dim:dy:dim], angy=[-angy,+angy])  
            translate([0,0,z])  
                rotate([0,angy,0])
                    cube([dim,dim,grid], center=true );
    }

}

module linearSlice( sh=100, sx=100, org=[0,0,0], rot=[0,0,0], center=true )
{
    Slice()
    {
        children();
        translate( org + [0,0,+sh/2] )
            rotate( rot )
                cube( [4*sx,2*sx,sh], center=center );
    }
}

module radialSlice( sh=100, sx=100, org=[0,0,0], rot=[0,0,0], mode=0, center=true )
{
    Steps = 120;
    Slice()
    {
        children();
        translate( org + [0,0,0] )
            rotate( rot )
                radialSliceHelper( d=2*sx, sh=sh, mode, center );
    }
}

module radialSliceHelper( d, sh, mode=0, center=true )
{
    gap = 0.1;  // 0.5 was too loose
    
    if( mode==0 ){
        cylinder( d=d, h=sh, center=center );
        }
            
    if( mode==1 ){
        difference(){
            union(){
                cylinder( d=d, h=sh, center=center );
                for( r=[0:120:360] )
                    translate([0,0,0]) rotate([0,90,r]) cylinder( d=10, h=d, center=center );
                }
            union(){
                for( r=[0:120:360] )
                    translate([0,0,sh]) rotate([0,90,r]) cylinder( d=10+0.2, h=d, center=center );
                }
            }
        }
 //hier war der marker..       
    if( mode==2 ){
        cx=5;
        cy=d/10;
        difference(){
            union(){
                cylinder( d=d, h=sh, center=center );
                for( r=[0:90:360] )
                    translate([0,0,0]) rotate([0,90,r]) cube([cx,cy,d],center=false); // d is diameter, cx,cy is size
                }
            union(){
                for( r=[0:90:360] )
                    translate([0,0,sh]) 
                        rotate([0,90,r]) 
                            translate([-gap,-gap/2,0])
                                cube([cx+gap*2,cy+gap,d],center=false);
                }
            }
        }
}

*rcube( [10,20,30], center=true, round=1 );
module rcube( size, center=true, round=1 )
{
    translate( center==true ? [0,0,0] : size/2 )
        hull() for (x=[1,-1],y=[1,-1],z=[1,-1]) translate([ x*size.x/2-round, y*size.y/2-round, z*size.z/2-round]) sphere( r=round );
}

module rcylinder( d=10, h=20, center=true, round=2 )
{
    minkowski(){
        cylinder( d=d-2*round, h=h-2*round, center=center);
        sphere( r=round );
        }
}

module show( d = [10,10,10] )
{
    for( i=[0:$children-1] )
    {
    translate( i * d )
        children(i);
    }
}
// main file
include <../planelib/inspectoer.scad>

fuseWingMount(pos=0);
